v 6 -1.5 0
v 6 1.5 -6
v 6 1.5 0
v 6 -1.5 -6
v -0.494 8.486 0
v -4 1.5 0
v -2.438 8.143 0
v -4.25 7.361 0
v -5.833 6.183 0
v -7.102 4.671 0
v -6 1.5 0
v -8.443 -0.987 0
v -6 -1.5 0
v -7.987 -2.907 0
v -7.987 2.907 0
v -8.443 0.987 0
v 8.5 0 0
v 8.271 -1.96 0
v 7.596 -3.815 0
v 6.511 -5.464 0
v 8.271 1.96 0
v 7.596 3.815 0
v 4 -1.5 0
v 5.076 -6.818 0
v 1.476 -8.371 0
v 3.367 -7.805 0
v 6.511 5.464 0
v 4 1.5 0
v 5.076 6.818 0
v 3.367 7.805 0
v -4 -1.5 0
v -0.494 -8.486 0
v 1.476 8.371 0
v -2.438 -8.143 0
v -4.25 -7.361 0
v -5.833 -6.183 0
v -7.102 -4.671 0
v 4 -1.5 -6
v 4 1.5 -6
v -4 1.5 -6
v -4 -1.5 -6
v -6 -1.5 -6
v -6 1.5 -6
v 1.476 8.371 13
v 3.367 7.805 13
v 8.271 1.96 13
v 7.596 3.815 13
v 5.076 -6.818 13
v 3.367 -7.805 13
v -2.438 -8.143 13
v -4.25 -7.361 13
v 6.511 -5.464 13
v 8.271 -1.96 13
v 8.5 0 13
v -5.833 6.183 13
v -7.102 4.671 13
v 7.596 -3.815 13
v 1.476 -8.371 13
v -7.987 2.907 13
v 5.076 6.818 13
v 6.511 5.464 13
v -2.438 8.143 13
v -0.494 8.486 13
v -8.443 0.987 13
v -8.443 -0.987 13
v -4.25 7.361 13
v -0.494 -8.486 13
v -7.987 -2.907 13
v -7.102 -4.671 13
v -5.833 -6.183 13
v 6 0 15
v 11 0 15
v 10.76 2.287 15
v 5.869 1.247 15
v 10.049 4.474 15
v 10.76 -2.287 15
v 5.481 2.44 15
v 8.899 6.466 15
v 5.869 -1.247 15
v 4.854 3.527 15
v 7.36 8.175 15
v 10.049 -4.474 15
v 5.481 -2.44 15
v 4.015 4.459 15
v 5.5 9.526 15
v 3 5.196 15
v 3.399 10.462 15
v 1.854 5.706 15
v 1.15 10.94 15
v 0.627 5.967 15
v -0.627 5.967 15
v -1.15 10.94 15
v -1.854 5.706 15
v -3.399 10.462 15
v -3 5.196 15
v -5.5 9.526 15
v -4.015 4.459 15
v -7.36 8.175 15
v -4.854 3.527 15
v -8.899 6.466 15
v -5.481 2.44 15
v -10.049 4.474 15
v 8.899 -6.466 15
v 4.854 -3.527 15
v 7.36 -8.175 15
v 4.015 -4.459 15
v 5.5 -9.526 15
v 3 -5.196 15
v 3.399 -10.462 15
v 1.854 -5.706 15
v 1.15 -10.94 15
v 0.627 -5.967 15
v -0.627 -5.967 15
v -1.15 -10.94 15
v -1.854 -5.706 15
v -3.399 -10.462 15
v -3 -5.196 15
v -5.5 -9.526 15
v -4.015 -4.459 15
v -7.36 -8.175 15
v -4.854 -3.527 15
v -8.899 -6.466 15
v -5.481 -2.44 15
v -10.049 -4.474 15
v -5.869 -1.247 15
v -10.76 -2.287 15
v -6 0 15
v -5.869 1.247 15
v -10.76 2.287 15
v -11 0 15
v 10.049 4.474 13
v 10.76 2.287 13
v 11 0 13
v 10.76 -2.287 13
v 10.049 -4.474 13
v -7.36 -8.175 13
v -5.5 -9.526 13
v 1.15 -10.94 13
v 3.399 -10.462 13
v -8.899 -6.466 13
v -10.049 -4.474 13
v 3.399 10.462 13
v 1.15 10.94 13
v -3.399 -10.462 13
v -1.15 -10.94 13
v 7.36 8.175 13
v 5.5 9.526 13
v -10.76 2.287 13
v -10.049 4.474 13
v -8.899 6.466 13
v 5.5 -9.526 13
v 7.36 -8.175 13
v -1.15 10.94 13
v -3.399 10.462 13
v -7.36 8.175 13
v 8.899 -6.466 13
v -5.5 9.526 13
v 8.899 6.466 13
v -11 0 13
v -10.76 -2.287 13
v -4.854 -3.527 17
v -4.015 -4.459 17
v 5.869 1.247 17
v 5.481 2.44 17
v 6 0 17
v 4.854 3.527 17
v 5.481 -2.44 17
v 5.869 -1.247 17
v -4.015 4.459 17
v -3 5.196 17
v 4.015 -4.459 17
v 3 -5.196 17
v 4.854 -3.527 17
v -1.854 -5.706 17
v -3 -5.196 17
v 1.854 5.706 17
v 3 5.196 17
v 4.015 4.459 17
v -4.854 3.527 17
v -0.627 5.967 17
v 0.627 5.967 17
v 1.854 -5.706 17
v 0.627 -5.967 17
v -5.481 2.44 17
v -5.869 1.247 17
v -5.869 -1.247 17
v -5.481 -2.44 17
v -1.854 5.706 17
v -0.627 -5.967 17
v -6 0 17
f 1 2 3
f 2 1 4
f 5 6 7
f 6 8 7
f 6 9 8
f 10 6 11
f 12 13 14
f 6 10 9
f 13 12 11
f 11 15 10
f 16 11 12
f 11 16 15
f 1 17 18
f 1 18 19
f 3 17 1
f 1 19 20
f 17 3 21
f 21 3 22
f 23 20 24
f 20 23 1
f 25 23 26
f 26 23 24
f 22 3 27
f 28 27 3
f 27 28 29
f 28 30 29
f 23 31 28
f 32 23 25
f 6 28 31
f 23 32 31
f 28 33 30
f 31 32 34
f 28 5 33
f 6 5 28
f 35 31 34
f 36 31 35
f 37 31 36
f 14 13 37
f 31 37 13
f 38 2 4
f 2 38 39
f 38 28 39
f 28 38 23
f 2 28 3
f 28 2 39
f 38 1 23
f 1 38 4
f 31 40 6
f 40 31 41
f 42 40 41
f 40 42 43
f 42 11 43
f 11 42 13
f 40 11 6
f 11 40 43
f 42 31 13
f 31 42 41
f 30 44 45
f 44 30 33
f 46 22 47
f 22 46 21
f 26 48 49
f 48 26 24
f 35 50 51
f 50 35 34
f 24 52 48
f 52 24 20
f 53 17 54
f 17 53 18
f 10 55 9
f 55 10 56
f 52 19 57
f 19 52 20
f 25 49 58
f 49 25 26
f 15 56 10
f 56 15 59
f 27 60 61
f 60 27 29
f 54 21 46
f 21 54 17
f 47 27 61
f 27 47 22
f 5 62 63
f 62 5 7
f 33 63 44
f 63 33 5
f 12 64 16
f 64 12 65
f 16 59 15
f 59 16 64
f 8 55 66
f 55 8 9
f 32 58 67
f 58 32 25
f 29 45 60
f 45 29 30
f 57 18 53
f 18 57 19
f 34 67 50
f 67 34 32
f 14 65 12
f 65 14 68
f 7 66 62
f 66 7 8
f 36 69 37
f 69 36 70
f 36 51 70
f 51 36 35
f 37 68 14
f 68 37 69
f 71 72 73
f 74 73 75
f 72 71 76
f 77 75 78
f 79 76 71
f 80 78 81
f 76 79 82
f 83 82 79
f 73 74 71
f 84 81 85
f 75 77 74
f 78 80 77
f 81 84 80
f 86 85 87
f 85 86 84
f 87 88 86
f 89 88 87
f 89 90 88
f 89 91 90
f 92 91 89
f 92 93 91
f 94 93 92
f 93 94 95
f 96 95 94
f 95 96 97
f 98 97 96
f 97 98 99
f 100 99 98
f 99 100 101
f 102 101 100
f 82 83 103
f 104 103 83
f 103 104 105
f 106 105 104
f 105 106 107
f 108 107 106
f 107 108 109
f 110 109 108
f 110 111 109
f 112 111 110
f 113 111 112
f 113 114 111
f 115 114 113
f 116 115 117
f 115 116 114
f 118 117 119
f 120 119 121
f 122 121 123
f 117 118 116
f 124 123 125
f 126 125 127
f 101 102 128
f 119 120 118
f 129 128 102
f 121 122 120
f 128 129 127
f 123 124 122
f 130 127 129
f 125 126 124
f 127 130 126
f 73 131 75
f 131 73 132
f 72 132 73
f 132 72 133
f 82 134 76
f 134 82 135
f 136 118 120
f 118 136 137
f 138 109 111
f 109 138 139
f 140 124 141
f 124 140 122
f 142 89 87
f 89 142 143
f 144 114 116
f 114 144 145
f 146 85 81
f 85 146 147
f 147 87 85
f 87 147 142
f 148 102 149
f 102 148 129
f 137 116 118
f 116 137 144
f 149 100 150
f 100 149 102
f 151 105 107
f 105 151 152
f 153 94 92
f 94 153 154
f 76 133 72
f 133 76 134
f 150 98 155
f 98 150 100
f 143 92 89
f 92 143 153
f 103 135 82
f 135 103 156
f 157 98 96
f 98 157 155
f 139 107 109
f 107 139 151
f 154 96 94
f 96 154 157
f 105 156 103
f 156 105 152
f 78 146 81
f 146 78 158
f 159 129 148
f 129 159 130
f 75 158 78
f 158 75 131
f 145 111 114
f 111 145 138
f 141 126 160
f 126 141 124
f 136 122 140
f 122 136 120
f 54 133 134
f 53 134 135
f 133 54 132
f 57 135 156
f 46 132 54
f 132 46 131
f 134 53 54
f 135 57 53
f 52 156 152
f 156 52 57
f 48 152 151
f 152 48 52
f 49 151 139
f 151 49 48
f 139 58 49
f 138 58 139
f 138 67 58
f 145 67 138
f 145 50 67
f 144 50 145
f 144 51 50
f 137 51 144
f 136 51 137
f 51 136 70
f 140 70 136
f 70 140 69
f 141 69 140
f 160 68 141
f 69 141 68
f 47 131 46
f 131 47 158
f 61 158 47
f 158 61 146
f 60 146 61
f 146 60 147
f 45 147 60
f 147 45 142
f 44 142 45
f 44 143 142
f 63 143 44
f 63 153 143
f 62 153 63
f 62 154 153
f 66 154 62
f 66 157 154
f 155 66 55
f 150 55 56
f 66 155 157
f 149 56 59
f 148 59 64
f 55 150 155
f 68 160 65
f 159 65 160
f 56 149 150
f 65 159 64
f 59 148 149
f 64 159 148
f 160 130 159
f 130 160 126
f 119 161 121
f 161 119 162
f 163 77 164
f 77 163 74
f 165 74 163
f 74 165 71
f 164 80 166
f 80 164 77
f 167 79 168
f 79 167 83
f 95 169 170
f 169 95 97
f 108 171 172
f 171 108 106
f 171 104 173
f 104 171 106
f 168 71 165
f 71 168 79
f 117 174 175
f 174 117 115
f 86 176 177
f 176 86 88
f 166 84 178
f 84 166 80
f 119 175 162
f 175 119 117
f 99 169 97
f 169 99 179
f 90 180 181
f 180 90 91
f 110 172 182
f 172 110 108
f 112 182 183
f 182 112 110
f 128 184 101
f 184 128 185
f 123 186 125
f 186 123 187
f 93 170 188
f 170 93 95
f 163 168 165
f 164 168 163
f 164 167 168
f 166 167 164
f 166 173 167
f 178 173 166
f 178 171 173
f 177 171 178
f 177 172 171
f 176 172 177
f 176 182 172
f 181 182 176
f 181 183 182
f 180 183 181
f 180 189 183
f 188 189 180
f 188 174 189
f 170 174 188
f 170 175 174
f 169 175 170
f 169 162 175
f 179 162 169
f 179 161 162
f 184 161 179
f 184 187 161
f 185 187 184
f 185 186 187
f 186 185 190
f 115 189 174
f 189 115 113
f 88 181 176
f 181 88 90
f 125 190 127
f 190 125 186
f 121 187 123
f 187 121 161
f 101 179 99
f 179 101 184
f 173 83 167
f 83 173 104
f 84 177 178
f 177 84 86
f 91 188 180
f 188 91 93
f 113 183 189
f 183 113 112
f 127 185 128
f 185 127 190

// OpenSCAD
module resetButton()
{
  cylinder(r=(16+1)/2, h=15);
  // soldering pins:
  translate([0,0,-6])
  {
    translate([-2/2+5,-3/2,0])
      cube([2,3,6]);
    translate([-2/2-5,-3/2,0])
      cube([2,3,6]);
  }
  // mounting cap
  translate([0,0,15-2])
    cylinder(r=22/2, h=2, $fs=1);
  // button's moving part
  translate([0,0,15])
    cylinder(r=16/2-2, h=2, $fs=1);
}

resetButton();
